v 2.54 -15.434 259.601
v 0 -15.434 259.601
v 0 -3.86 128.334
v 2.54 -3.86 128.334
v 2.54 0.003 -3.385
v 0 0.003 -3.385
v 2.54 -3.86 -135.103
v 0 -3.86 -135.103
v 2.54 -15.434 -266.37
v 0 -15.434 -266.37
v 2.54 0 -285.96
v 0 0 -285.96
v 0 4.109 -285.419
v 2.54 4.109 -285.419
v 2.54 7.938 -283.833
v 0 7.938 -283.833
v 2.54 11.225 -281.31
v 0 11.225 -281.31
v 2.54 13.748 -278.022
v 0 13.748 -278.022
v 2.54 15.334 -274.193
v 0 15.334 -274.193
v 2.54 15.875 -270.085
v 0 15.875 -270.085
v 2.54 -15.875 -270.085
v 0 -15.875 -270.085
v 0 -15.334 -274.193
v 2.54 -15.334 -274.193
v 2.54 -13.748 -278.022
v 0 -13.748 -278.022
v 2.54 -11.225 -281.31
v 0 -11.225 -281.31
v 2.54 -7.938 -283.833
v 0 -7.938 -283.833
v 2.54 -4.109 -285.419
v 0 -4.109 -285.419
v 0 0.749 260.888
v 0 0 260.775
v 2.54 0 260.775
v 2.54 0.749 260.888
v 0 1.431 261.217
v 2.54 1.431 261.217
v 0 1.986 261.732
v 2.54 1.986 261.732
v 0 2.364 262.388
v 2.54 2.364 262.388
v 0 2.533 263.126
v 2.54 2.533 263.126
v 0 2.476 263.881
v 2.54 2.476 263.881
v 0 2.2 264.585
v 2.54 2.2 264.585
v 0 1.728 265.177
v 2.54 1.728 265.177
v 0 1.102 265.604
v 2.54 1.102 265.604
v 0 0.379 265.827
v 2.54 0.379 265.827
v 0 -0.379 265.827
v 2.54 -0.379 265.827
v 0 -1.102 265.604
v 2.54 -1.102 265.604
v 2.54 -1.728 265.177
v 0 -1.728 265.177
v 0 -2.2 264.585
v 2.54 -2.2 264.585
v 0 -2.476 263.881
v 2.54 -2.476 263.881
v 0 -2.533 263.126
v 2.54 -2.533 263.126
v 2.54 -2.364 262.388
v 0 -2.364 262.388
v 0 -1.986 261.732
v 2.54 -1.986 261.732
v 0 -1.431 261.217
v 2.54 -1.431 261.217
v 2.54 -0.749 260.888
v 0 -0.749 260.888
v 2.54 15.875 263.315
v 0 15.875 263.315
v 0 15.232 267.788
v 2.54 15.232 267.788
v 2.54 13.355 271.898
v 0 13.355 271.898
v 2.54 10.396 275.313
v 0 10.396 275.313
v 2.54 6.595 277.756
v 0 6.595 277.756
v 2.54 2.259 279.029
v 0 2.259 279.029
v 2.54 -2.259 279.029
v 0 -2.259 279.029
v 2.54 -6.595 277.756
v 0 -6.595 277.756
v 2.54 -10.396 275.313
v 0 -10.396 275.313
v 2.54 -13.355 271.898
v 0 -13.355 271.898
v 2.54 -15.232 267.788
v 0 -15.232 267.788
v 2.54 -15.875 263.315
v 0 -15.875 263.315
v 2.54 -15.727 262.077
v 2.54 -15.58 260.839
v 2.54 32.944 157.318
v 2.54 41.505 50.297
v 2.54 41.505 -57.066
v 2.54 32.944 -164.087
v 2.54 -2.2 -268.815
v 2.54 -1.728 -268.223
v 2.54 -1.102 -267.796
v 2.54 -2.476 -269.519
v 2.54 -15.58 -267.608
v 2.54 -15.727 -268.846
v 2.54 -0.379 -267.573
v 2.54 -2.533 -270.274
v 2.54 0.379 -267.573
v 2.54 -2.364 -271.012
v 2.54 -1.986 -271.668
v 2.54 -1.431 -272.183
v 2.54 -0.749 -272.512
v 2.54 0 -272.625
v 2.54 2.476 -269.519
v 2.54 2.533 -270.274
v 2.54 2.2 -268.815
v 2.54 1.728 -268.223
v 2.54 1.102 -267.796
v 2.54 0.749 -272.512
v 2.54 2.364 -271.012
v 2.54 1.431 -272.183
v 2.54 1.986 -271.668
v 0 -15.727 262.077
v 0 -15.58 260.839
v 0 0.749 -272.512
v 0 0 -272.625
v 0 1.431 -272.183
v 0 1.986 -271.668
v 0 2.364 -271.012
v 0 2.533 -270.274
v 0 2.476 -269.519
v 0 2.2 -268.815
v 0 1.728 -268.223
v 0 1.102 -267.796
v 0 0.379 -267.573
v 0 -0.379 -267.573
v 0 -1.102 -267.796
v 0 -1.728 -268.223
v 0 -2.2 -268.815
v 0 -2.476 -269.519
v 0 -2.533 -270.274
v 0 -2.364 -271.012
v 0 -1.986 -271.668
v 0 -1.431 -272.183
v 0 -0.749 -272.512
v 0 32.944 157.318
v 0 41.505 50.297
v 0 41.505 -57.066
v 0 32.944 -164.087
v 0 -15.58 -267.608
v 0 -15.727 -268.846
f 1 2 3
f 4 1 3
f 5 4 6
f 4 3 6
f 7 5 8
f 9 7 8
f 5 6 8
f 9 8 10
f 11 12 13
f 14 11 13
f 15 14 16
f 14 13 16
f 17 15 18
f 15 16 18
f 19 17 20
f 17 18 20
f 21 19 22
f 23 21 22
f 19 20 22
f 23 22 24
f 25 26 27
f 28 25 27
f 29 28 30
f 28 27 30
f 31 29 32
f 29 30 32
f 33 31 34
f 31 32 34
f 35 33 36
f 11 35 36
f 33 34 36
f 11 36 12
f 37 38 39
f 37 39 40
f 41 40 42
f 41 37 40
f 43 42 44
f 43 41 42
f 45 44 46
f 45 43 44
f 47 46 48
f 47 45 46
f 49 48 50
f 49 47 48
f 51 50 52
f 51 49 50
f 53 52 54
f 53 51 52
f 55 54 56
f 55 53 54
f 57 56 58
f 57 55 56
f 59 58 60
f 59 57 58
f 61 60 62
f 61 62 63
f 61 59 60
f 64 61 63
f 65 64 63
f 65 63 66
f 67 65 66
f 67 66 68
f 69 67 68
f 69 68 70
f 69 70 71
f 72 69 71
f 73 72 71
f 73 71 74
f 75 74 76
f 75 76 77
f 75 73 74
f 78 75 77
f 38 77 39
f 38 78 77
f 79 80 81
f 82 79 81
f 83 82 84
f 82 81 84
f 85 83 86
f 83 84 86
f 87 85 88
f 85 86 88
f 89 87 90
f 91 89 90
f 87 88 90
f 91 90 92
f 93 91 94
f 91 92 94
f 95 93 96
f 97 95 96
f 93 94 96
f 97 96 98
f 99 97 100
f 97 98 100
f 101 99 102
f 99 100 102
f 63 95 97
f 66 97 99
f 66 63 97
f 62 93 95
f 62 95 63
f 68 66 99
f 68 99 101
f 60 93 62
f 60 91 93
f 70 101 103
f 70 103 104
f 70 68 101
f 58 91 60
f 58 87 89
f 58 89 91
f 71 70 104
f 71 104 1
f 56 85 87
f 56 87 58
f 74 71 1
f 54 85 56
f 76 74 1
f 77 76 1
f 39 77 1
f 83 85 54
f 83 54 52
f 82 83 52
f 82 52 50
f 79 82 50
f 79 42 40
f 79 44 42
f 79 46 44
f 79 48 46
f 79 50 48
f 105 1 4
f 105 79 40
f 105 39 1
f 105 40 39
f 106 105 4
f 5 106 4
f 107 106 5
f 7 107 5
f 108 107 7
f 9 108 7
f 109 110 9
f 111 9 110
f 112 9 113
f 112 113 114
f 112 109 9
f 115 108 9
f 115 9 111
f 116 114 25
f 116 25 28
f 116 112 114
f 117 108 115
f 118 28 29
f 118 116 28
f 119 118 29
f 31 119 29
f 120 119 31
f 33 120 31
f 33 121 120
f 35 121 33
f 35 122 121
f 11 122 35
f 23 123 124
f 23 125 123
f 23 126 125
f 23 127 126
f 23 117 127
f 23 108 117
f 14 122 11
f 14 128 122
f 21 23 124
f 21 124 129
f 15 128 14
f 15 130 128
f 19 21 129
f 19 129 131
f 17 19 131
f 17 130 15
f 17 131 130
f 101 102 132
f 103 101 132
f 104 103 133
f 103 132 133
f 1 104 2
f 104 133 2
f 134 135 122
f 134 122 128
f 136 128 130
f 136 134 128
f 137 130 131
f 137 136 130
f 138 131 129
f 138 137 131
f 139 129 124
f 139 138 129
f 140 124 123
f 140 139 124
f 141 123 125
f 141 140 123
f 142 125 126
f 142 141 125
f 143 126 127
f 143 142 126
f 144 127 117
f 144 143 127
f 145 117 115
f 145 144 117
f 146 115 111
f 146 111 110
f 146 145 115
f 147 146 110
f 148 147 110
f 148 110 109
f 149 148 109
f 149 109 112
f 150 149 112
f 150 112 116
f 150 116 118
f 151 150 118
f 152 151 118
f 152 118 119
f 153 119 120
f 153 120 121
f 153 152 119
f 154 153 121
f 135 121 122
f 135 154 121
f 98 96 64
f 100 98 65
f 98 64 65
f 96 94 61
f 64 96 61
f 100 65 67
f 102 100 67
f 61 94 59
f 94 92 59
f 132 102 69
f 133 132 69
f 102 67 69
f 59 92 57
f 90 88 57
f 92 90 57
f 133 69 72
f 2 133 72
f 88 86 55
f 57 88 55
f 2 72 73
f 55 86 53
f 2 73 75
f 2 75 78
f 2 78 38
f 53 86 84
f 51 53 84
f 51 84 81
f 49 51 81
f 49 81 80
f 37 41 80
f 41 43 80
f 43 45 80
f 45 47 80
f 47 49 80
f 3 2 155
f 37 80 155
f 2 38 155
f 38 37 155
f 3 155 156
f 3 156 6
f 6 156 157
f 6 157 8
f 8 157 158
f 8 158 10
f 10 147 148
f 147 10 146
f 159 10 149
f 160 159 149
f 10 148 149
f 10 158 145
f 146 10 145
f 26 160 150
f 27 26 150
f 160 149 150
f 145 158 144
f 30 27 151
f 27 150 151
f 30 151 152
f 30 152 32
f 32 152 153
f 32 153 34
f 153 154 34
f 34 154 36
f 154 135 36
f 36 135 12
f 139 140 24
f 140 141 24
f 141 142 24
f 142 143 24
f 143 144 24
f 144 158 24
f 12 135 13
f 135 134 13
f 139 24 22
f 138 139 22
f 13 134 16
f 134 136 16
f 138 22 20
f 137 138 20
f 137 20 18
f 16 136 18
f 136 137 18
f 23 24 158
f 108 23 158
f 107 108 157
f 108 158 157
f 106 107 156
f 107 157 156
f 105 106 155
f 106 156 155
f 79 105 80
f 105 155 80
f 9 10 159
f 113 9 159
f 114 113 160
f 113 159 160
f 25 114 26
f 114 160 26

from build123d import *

# Parameters (mm, degrees)
SKETCH1_R           = 2.54
BOSS_EXTRUDE1_DEPTH = 2.54


with BuildPart() as part:
    # Sketch1 → Boss-Extrude1 (new body)
    # profile 1 of 3: a face of its own
    with BuildSketch(Plane(origin=(0, 0, 0), x_dir=(0, 0, -1), z_dir=(1, 0, 0))):
        with BuildLine():
            ThreePointArc((-263.315482234, 15.875), (-252.090162082, 11.225320151), (-247.440482234, 0))
            ThreePointArc((-247.440482234, 0), (-250.845779802, -9.824568503), (-259.600752631, -15.434260882))
            ThreePointArc((-259.600752631, -15.434260882), (3.384517766, 0.002547972), (266.369788164, -15.434260882))
            ThreePointArc((266.369788164, -15.434260882), (254.320087607, 1.870392137), (270.084517766, 15.875))
            ThreePointArc((270.084517766, 15.875), (3.384517766, 42.576584001), (-263.315482234, 15.875))
        make_face()
    # profile 2 of 3: a face of its own
    with BuildSketch(Plane(origin=(0, 0, 0), x_dir=(0, 0, -1), z_dir=(1, 0, 0))):
        with BuildLine():
            ThreePointArc((-259.600752631, -15.434260882), (-250.845779802, -9.824568503), (-247.440482234, 0))
            ThreePointArc((-247.440482234, 0), (-252.090162082, 11.225320151), (-263.315482234, 15.875))
            ThreePointArc((-263.315482234, 15.875), (-279.190482234, 0), (-263.315482234, -15.875))
            ThreePointArc((-263.315482234, -15.875), (-261.458209114, -15.653857706), (-259.600752631, -15.434260882))
        make_face()
        with Locations((-263.315482234, 0)):
            Circle(SKETCH1_R, mode=Mode.SUBTRACT)
    # profile 3 of 3: a face of its own
    with BuildSketch(Plane(origin=(0, 0, 0), x_dir=(0, 0, -1), z_dir=(1, 0, 0))):
        with BuildLine():
            ThreePointArc((285.959517766, 0), (281.309837918, 11.225320151), (270.084517766, 15.875))
            ThreePointArc((270.084517766, 15.875), (254.320087607, 1.870392137), (266.369788164, -15.434260882))
            ThreePointArc((266.369788164, -15.434260882), (268.227244647, -15.653857706), (270.084517766, -15.875))
            ThreePointArc((270.084517766, -15.875), (281.309837918, -11.225320151), (285.959517766, 0))
        make_face()
        with Locations((270.084517766, 0)):
            Circle(SKETCH1_R, mode=Mode.SUBTRACT)
    extrude(amount=BOSS_EXTRUDE1_DEPTH)


solid = part.part
